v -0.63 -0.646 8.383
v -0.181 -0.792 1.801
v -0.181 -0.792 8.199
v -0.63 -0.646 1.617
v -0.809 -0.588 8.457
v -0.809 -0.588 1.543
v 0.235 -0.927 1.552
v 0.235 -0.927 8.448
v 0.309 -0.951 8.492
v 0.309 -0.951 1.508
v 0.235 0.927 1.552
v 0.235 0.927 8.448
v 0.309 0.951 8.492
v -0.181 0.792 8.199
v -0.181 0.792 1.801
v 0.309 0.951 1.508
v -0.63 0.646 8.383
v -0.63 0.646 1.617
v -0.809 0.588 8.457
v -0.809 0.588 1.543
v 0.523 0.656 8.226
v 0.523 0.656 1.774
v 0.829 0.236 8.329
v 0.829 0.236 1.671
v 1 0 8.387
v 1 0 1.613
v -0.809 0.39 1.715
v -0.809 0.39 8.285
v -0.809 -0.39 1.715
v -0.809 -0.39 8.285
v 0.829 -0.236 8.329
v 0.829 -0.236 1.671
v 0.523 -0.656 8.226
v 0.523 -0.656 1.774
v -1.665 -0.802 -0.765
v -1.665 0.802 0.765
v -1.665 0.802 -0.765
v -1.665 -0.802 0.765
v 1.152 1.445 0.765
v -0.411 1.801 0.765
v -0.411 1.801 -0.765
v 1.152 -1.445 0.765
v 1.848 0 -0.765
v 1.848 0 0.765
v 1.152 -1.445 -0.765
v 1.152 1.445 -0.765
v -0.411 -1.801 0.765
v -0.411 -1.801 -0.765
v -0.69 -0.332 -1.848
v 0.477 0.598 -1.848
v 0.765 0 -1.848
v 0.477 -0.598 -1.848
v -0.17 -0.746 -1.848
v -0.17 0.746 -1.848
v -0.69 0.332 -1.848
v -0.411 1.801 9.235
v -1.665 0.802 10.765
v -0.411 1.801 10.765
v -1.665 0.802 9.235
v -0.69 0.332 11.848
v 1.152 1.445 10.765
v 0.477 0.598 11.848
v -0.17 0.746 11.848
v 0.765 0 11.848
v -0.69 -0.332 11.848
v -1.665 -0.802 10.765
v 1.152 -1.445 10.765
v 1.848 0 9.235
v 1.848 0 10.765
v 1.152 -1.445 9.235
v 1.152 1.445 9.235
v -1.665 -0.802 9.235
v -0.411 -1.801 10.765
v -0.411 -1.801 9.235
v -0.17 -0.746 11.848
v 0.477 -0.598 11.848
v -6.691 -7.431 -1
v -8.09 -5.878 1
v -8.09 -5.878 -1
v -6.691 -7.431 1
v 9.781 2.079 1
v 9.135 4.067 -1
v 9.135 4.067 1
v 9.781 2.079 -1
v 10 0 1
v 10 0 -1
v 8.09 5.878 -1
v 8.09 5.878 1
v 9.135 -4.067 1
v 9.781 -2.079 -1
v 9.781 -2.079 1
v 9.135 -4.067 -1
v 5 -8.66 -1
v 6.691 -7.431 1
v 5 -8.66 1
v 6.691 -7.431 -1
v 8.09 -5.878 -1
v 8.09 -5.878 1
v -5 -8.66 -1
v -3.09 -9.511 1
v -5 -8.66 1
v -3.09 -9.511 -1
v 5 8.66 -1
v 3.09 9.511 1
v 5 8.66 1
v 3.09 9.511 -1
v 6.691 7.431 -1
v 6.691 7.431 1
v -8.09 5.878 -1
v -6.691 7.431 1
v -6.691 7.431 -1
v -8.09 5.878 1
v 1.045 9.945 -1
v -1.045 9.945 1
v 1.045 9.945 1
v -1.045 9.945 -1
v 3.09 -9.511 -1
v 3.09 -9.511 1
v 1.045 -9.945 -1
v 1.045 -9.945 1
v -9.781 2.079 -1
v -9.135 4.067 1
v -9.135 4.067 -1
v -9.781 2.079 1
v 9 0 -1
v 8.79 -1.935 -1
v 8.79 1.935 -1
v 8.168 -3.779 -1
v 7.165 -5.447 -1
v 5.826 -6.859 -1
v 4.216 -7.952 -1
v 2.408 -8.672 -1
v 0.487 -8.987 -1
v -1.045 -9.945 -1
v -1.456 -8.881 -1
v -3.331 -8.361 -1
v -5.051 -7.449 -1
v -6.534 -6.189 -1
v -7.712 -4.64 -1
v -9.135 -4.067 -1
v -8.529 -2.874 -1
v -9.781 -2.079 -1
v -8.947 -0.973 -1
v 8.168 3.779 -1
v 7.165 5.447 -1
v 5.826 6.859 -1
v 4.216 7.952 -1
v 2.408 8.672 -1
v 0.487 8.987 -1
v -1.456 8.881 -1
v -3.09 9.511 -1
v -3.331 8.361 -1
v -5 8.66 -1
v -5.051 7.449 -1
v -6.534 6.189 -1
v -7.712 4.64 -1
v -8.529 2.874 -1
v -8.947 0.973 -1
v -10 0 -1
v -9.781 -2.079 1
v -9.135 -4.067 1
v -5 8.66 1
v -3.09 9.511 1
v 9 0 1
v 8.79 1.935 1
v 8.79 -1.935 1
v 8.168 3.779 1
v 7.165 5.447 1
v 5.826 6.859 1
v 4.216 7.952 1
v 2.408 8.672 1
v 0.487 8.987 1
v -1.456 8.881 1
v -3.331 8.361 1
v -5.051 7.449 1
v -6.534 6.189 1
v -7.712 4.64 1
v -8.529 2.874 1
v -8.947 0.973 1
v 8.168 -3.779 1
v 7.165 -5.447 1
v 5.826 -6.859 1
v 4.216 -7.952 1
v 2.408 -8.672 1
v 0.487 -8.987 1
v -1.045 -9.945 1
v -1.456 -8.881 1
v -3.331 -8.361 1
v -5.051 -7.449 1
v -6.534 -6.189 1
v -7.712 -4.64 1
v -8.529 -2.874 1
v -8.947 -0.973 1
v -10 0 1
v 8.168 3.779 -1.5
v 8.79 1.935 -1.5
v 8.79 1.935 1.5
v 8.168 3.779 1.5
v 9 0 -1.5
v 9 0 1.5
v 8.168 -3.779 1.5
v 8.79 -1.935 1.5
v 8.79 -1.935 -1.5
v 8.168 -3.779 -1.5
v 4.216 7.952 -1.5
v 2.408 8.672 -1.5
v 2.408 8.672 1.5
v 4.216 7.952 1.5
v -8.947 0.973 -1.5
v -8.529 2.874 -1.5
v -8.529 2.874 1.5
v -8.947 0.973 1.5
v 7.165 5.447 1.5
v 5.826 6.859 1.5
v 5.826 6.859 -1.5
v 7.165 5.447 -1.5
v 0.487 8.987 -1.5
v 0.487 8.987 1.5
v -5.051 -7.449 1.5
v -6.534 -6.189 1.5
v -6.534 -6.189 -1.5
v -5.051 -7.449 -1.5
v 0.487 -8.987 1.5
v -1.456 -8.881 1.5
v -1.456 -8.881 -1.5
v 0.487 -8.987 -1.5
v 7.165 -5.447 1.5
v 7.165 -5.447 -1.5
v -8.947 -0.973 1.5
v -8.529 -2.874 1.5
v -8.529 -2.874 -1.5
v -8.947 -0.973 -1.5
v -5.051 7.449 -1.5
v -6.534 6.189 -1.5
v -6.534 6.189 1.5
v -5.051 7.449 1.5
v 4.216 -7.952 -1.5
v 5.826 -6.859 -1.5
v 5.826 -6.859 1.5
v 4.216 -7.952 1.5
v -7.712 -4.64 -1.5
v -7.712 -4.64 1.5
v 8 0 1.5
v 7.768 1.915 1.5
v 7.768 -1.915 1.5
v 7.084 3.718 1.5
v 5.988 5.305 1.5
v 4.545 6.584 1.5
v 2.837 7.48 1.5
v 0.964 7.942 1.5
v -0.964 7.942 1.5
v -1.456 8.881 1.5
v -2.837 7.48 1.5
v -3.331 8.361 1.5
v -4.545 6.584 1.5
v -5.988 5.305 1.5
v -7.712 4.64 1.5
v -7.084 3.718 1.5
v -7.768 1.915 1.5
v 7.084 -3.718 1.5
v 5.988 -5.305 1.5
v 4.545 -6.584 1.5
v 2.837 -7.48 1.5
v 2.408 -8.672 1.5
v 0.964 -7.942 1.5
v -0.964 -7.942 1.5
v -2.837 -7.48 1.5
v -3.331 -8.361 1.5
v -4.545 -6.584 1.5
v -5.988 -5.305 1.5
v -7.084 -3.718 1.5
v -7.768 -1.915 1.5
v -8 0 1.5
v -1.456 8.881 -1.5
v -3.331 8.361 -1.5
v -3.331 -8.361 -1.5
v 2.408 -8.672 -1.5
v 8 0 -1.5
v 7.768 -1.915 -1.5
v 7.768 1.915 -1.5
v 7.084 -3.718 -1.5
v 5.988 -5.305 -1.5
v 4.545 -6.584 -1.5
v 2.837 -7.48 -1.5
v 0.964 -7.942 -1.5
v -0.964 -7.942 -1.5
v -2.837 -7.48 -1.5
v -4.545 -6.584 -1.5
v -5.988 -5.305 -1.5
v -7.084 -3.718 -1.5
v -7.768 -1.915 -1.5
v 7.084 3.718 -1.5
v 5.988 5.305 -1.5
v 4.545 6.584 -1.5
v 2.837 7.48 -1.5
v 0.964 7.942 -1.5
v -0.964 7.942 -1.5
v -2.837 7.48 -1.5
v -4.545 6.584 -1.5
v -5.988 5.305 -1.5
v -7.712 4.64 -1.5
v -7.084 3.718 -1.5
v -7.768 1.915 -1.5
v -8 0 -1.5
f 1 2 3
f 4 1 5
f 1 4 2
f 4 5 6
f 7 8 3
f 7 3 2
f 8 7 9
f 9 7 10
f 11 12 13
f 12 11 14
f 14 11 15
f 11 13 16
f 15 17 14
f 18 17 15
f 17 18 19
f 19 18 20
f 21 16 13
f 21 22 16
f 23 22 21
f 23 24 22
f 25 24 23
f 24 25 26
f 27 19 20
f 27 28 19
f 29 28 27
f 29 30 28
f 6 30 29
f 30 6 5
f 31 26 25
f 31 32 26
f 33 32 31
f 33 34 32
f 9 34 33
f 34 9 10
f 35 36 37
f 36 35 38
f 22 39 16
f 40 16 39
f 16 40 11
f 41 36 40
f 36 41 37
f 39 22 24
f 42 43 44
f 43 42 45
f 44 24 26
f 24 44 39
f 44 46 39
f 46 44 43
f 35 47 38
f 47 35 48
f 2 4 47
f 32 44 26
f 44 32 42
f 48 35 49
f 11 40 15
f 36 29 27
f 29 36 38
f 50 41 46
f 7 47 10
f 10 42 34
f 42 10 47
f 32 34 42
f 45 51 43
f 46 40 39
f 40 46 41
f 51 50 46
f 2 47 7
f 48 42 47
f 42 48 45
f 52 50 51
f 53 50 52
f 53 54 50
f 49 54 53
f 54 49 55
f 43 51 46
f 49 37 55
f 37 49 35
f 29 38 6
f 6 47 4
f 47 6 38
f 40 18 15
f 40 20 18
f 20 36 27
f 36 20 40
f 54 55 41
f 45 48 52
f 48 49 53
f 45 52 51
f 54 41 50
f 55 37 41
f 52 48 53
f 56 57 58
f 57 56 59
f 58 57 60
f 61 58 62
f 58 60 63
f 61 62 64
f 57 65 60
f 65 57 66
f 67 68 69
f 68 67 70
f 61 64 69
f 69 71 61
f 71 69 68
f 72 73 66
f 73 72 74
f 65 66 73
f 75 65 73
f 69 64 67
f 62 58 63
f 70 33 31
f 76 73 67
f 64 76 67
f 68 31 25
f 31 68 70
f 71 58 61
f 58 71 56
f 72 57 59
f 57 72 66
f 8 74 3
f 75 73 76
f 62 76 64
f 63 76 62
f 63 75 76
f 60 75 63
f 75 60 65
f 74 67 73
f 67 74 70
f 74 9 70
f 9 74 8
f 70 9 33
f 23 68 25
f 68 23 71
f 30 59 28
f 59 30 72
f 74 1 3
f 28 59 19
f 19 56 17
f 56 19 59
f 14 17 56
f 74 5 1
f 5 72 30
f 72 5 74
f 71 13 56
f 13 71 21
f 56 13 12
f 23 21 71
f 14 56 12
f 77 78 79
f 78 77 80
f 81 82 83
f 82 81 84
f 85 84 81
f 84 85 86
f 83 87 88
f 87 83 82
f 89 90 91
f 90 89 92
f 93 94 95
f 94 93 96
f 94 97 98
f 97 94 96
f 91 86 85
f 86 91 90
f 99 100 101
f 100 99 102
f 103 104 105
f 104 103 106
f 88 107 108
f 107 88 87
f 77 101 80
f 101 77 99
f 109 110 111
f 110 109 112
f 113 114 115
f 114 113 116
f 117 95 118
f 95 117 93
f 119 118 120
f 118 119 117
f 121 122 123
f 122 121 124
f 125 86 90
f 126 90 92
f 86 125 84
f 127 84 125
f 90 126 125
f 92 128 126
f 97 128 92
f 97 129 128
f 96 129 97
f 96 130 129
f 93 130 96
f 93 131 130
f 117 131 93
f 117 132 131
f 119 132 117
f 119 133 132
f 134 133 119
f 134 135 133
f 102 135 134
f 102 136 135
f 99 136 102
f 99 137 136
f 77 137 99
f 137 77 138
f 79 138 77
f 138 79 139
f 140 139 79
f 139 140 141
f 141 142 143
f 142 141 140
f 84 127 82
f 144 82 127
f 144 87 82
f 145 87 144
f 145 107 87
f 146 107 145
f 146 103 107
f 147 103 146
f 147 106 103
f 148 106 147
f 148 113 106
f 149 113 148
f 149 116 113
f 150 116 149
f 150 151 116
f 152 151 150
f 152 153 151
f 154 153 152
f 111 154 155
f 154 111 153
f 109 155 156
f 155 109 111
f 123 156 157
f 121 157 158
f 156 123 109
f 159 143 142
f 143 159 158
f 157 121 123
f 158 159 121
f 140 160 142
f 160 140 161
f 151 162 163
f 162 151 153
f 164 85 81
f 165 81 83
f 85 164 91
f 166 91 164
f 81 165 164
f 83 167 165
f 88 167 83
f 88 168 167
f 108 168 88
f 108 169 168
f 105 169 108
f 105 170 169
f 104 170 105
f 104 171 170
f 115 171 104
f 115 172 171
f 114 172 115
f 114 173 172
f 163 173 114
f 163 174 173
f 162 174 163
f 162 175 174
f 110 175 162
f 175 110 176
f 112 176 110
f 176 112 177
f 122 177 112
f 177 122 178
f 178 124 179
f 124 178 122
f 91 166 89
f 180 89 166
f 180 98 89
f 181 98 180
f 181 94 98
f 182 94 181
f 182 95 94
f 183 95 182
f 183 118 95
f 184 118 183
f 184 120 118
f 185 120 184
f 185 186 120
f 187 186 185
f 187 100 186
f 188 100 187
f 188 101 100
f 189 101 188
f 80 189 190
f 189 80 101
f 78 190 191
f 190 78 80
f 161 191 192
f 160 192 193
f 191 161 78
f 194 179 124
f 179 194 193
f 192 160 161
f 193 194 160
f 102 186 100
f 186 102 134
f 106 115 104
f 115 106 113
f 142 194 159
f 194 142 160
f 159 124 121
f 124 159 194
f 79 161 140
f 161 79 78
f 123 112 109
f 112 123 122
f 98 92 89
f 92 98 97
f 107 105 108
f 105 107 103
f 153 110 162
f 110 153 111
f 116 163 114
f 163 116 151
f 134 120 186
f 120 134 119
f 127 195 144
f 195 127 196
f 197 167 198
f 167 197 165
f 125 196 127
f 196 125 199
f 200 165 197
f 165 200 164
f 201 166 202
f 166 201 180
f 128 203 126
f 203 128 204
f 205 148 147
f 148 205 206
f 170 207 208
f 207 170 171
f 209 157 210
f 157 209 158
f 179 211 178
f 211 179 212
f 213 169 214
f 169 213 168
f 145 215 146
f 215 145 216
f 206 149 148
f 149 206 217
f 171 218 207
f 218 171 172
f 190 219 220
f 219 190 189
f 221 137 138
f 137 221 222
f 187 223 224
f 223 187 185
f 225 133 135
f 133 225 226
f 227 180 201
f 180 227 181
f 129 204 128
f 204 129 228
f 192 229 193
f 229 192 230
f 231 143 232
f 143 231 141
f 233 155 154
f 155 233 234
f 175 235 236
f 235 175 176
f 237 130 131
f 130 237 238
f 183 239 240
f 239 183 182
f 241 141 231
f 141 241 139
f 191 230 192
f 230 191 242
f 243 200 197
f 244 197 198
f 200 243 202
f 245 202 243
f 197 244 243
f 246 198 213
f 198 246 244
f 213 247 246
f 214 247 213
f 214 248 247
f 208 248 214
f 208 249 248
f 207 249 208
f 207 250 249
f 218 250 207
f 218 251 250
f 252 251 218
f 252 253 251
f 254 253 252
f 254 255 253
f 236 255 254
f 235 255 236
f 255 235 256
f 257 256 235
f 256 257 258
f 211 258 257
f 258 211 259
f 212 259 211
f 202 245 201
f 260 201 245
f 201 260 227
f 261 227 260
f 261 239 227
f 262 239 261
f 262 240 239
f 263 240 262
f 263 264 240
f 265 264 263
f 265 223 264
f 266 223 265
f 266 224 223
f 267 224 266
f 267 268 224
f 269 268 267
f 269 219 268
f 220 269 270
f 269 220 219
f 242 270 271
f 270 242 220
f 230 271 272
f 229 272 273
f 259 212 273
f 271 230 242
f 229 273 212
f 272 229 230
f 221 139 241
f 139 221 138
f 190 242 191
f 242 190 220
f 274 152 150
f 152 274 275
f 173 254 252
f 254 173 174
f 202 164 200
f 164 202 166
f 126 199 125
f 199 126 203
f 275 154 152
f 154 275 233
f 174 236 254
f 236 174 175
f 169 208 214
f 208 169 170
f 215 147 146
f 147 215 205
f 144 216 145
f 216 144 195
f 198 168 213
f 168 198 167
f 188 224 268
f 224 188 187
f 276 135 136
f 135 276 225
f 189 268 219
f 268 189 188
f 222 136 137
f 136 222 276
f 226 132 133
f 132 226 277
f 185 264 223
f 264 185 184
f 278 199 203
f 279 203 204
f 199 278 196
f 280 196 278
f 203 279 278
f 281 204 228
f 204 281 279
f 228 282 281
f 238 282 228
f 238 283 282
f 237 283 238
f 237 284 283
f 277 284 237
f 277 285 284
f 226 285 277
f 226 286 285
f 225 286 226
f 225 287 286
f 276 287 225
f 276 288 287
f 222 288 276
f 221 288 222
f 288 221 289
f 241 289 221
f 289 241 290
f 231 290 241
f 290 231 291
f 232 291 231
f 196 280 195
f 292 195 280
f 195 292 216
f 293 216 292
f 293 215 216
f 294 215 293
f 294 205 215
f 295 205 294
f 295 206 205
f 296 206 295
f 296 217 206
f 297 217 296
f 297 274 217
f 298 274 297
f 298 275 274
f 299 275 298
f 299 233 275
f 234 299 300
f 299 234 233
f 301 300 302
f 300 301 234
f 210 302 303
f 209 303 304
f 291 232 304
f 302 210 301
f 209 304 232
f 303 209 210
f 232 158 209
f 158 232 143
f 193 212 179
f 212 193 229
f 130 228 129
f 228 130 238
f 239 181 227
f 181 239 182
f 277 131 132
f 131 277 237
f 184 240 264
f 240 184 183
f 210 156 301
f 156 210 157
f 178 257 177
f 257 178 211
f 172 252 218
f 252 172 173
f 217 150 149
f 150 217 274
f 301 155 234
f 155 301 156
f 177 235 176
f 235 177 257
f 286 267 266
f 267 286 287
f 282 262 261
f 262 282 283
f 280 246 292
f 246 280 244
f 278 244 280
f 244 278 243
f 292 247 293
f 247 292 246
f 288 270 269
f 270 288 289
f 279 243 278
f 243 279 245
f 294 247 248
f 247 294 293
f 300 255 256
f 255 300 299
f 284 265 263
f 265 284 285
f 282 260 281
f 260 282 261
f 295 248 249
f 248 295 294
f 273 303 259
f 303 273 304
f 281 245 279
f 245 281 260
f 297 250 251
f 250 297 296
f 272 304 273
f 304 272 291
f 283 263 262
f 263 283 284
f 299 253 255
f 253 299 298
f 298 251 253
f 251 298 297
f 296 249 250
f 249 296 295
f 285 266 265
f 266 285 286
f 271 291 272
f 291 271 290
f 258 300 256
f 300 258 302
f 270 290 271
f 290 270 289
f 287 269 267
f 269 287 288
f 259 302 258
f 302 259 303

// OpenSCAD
// union and difference operators
union() {
    cylinder(r=1,h=10);
    sphere(r=2);
    translate([0,0,10]) sphere(r=2);
}
difference() {
    union() {
        cylinder(r=10,h=2,center=true);
        cylinder(r=9,h=3,center=true);
    }
    cylinder(r=8,h=4,center=true);
}
